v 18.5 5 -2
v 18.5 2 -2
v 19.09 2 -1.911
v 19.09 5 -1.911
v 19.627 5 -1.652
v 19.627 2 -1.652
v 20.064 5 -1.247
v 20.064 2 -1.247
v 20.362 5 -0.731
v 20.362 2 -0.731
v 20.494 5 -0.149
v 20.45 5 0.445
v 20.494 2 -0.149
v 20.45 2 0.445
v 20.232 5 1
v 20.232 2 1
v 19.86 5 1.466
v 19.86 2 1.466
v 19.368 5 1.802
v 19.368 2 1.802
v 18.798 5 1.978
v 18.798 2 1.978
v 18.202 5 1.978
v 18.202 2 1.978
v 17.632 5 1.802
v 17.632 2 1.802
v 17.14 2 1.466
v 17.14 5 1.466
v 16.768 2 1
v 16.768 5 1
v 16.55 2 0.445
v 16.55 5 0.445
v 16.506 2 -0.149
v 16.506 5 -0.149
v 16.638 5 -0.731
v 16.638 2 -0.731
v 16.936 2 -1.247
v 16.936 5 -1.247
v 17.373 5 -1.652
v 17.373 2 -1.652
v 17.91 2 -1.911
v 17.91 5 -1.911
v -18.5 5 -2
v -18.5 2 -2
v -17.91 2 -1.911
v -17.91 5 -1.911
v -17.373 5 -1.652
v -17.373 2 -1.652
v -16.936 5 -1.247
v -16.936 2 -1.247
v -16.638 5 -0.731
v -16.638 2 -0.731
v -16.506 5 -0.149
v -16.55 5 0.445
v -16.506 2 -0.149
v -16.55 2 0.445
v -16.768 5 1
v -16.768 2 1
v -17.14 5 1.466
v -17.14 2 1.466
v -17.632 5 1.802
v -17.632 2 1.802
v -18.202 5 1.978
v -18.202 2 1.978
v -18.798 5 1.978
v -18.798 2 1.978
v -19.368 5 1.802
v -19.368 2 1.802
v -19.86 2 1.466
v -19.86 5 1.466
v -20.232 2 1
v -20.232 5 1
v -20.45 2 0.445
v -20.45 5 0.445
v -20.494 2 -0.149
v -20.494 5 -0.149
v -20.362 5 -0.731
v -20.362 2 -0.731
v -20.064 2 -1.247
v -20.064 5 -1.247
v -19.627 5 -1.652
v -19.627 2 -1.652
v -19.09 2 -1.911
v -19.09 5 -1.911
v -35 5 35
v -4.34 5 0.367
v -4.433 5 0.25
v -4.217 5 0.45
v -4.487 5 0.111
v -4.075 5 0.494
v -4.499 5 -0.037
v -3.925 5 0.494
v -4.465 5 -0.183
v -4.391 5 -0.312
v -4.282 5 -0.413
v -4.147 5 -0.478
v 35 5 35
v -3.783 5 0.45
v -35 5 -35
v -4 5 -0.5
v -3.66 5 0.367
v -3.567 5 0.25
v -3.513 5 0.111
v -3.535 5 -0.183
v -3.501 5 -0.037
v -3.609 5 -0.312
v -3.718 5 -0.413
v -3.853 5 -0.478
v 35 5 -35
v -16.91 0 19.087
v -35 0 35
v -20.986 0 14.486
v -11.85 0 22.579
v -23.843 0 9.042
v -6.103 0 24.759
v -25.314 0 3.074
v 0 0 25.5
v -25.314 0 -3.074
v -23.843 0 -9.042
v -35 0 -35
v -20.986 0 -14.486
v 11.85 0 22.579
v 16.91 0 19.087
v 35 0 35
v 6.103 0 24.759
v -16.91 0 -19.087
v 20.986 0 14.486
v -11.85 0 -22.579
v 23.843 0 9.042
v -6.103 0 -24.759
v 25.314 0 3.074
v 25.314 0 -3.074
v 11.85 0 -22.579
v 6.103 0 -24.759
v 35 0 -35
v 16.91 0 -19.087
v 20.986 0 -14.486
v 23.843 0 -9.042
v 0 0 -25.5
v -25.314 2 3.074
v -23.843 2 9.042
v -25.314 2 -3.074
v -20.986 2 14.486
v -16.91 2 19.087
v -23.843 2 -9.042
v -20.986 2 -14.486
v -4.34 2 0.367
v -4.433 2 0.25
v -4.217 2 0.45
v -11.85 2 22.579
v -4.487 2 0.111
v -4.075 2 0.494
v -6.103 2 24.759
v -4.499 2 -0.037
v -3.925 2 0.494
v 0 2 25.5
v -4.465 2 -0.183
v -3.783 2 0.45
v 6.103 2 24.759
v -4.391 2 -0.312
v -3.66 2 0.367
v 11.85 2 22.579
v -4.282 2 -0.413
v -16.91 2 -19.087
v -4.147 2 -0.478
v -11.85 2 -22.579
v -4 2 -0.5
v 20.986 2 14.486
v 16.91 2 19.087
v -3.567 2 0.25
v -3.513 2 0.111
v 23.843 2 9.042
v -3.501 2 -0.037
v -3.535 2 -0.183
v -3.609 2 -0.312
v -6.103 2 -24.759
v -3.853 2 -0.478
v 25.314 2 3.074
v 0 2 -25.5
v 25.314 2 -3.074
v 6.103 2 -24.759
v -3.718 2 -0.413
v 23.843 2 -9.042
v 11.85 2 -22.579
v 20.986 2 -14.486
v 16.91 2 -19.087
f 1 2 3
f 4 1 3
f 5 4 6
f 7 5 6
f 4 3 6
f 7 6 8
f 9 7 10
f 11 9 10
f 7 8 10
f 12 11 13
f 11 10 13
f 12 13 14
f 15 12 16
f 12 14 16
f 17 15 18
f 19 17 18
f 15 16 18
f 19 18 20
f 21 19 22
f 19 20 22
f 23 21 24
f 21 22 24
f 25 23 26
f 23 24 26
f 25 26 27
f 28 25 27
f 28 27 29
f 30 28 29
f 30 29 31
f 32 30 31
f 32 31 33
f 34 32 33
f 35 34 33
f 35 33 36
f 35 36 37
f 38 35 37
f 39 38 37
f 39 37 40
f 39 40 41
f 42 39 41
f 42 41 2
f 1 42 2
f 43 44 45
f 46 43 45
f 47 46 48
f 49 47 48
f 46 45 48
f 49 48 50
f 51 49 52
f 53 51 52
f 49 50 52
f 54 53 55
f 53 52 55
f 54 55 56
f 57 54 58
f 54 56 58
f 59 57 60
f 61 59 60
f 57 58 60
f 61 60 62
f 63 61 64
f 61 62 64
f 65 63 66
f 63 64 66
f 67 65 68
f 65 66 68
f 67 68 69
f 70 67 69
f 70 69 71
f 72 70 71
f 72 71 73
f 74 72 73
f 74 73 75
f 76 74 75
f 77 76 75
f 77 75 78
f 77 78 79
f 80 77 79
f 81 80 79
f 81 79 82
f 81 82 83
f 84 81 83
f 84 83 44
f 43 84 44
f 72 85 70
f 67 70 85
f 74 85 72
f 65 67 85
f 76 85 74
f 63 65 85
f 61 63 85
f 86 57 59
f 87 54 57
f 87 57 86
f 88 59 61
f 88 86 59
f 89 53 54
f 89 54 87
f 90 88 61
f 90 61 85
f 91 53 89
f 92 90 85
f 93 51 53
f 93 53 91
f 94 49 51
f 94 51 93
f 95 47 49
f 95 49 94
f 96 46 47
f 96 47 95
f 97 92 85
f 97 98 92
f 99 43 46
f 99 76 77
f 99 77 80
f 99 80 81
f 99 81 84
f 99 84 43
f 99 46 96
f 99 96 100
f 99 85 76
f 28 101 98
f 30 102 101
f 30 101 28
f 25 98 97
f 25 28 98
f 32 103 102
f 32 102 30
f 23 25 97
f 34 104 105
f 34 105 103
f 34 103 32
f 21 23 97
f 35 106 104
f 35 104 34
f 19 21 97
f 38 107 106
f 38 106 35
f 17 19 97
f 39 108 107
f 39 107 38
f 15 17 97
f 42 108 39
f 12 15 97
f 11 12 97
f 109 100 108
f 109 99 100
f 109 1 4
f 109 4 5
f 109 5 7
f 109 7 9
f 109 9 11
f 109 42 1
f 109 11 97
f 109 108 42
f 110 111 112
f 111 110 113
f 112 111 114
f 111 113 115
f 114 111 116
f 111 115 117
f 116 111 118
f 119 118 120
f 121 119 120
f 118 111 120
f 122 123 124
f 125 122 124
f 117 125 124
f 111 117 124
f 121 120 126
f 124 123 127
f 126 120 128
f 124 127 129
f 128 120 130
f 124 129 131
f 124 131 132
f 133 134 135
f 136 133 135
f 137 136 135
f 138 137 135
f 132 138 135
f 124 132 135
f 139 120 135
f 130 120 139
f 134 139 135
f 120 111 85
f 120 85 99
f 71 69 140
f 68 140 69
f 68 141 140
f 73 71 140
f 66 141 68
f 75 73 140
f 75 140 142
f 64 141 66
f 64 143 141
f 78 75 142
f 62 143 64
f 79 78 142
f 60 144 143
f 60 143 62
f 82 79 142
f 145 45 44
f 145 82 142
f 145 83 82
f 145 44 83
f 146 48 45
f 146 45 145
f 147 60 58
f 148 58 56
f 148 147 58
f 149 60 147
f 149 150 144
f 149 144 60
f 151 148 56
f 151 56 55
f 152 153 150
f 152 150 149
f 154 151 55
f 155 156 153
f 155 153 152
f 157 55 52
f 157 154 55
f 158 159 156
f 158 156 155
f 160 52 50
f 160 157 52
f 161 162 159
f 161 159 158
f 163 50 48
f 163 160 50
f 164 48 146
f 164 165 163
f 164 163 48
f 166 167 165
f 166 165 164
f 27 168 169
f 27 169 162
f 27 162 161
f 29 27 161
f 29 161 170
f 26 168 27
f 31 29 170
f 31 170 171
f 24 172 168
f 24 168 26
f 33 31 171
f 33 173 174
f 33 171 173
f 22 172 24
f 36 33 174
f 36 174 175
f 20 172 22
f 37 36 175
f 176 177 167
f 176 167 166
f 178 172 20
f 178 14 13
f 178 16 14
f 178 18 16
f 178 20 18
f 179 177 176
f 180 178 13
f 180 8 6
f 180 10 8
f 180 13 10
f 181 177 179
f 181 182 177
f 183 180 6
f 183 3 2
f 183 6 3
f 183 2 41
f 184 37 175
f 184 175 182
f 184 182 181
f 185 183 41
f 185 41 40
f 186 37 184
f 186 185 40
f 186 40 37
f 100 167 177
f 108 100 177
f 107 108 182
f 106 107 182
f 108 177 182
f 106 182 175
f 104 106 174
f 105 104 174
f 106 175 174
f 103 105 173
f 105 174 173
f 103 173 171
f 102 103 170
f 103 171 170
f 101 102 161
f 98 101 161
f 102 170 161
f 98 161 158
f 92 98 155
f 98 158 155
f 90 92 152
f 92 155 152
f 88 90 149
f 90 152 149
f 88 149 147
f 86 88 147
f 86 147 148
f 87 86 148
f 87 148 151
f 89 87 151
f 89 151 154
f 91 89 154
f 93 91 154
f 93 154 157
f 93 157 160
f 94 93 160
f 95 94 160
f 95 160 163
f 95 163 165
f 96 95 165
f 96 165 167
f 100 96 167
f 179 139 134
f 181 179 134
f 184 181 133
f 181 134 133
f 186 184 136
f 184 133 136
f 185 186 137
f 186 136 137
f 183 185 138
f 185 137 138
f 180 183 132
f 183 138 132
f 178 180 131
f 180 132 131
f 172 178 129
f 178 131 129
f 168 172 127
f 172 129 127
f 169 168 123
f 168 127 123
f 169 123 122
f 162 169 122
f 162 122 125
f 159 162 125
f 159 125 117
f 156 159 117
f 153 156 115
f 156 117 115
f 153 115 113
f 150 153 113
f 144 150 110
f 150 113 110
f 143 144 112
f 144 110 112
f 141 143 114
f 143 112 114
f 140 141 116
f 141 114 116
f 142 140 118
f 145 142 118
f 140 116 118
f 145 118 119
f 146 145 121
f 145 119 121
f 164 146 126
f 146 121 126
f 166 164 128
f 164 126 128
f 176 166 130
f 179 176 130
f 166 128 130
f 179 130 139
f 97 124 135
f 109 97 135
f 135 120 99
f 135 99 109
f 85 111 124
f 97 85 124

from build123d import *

# Parameters (mm, degrees)
SKETCH1_W           = 70
SKETCH1_H           = 70
BOSS_EXTRUDE1_DEPTH = 5
SKETCH2_R           = 25.5
SKETCH2_R_2         = 2
CUT_EXTRUDE3_DEPTH  = 2
SKETCH3_R           = 2
CUT_EXTRUDE4_DEPTH  = 10
SKETCH4_R           = 2
CUT_EXTRUDE5_DEPTH  = 10
SKETCH5_R           = 0.5
CUT_EXTRUDE7_DEPTH  = 10


with BuildPart() as part:
    # Sketch1 → Boss-Extrude1 (new body)
    with BuildSketch(Plane(origin=(0, 0, 0), x_dir=(1, 0, 0), z_dir=(0, 1, 0))):
        Rectangle(SKETCH1_W, SKETCH1_H)
    extrude(amount=BOSS_EXTRUDE1_DEPTH)

    # Sketch2 → Cut-Extrude3 (cut)
    with BuildSketch(Plane.XZ):
        with Locations(Location((0, 0, 0), (0, 0, 270))):
            Circle(SKETCH2_R)
        with Locations(Location((-18.5, 0, 0), (0, 0, 270))):
            Circle(SKETCH2_R_2, mode=Mode.SUBTRACT)
        with Locations(Location((18.5, 0, 0), (0, 0, 90))):
            Circle(SKETCH2_R_2, mode=Mode.SUBTRACT)
    extrude(amount=-CUT_EXTRUDE3_DEPTH, mode=Mode.SUBTRACT)

    # Sketch3 → Cut-Extrude4 (cut)
    with BuildSketch(Plane.XZ):
        with Locations(Location((18.5, 0, 0), (0, 0, 270))):
            Circle(SKETCH3_R)
    extrude(amount=-CUT_EXTRUDE4_DEPTH, mode=Mode.SUBTRACT)

    # Sketch4 → Cut-Extrude5 (cut)
    with BuildSketch(Plane(origin=(0, 0, 0), x_dir=(-1, 0, 0), z_dir=(0, -1, 0))):
        with Locations(Location((18.5, 0, 0), (0, 0, 90))):
            Circle(SKETCH4_R)
    extrude(amount=-CUT_EXTRUDE5_DEPTH, mode=Mode.SUBTRACT)

    # Sketch5 → Cut-Extrude7 (cut)
    with BuildSketch(Plane(origin=(0, 2, 0), x_dir=(-1, 0, 0), z_dir=(0, -1, 0))):
        with Locations(Location((4, 0, 0), (0, 0, 90))):
            Circle(SKETCH5_R)
    extrude(amount=-CUT_EXTRUDE7_DEPTH, mode=Mode.SUBTRACT)


solid = part.part
